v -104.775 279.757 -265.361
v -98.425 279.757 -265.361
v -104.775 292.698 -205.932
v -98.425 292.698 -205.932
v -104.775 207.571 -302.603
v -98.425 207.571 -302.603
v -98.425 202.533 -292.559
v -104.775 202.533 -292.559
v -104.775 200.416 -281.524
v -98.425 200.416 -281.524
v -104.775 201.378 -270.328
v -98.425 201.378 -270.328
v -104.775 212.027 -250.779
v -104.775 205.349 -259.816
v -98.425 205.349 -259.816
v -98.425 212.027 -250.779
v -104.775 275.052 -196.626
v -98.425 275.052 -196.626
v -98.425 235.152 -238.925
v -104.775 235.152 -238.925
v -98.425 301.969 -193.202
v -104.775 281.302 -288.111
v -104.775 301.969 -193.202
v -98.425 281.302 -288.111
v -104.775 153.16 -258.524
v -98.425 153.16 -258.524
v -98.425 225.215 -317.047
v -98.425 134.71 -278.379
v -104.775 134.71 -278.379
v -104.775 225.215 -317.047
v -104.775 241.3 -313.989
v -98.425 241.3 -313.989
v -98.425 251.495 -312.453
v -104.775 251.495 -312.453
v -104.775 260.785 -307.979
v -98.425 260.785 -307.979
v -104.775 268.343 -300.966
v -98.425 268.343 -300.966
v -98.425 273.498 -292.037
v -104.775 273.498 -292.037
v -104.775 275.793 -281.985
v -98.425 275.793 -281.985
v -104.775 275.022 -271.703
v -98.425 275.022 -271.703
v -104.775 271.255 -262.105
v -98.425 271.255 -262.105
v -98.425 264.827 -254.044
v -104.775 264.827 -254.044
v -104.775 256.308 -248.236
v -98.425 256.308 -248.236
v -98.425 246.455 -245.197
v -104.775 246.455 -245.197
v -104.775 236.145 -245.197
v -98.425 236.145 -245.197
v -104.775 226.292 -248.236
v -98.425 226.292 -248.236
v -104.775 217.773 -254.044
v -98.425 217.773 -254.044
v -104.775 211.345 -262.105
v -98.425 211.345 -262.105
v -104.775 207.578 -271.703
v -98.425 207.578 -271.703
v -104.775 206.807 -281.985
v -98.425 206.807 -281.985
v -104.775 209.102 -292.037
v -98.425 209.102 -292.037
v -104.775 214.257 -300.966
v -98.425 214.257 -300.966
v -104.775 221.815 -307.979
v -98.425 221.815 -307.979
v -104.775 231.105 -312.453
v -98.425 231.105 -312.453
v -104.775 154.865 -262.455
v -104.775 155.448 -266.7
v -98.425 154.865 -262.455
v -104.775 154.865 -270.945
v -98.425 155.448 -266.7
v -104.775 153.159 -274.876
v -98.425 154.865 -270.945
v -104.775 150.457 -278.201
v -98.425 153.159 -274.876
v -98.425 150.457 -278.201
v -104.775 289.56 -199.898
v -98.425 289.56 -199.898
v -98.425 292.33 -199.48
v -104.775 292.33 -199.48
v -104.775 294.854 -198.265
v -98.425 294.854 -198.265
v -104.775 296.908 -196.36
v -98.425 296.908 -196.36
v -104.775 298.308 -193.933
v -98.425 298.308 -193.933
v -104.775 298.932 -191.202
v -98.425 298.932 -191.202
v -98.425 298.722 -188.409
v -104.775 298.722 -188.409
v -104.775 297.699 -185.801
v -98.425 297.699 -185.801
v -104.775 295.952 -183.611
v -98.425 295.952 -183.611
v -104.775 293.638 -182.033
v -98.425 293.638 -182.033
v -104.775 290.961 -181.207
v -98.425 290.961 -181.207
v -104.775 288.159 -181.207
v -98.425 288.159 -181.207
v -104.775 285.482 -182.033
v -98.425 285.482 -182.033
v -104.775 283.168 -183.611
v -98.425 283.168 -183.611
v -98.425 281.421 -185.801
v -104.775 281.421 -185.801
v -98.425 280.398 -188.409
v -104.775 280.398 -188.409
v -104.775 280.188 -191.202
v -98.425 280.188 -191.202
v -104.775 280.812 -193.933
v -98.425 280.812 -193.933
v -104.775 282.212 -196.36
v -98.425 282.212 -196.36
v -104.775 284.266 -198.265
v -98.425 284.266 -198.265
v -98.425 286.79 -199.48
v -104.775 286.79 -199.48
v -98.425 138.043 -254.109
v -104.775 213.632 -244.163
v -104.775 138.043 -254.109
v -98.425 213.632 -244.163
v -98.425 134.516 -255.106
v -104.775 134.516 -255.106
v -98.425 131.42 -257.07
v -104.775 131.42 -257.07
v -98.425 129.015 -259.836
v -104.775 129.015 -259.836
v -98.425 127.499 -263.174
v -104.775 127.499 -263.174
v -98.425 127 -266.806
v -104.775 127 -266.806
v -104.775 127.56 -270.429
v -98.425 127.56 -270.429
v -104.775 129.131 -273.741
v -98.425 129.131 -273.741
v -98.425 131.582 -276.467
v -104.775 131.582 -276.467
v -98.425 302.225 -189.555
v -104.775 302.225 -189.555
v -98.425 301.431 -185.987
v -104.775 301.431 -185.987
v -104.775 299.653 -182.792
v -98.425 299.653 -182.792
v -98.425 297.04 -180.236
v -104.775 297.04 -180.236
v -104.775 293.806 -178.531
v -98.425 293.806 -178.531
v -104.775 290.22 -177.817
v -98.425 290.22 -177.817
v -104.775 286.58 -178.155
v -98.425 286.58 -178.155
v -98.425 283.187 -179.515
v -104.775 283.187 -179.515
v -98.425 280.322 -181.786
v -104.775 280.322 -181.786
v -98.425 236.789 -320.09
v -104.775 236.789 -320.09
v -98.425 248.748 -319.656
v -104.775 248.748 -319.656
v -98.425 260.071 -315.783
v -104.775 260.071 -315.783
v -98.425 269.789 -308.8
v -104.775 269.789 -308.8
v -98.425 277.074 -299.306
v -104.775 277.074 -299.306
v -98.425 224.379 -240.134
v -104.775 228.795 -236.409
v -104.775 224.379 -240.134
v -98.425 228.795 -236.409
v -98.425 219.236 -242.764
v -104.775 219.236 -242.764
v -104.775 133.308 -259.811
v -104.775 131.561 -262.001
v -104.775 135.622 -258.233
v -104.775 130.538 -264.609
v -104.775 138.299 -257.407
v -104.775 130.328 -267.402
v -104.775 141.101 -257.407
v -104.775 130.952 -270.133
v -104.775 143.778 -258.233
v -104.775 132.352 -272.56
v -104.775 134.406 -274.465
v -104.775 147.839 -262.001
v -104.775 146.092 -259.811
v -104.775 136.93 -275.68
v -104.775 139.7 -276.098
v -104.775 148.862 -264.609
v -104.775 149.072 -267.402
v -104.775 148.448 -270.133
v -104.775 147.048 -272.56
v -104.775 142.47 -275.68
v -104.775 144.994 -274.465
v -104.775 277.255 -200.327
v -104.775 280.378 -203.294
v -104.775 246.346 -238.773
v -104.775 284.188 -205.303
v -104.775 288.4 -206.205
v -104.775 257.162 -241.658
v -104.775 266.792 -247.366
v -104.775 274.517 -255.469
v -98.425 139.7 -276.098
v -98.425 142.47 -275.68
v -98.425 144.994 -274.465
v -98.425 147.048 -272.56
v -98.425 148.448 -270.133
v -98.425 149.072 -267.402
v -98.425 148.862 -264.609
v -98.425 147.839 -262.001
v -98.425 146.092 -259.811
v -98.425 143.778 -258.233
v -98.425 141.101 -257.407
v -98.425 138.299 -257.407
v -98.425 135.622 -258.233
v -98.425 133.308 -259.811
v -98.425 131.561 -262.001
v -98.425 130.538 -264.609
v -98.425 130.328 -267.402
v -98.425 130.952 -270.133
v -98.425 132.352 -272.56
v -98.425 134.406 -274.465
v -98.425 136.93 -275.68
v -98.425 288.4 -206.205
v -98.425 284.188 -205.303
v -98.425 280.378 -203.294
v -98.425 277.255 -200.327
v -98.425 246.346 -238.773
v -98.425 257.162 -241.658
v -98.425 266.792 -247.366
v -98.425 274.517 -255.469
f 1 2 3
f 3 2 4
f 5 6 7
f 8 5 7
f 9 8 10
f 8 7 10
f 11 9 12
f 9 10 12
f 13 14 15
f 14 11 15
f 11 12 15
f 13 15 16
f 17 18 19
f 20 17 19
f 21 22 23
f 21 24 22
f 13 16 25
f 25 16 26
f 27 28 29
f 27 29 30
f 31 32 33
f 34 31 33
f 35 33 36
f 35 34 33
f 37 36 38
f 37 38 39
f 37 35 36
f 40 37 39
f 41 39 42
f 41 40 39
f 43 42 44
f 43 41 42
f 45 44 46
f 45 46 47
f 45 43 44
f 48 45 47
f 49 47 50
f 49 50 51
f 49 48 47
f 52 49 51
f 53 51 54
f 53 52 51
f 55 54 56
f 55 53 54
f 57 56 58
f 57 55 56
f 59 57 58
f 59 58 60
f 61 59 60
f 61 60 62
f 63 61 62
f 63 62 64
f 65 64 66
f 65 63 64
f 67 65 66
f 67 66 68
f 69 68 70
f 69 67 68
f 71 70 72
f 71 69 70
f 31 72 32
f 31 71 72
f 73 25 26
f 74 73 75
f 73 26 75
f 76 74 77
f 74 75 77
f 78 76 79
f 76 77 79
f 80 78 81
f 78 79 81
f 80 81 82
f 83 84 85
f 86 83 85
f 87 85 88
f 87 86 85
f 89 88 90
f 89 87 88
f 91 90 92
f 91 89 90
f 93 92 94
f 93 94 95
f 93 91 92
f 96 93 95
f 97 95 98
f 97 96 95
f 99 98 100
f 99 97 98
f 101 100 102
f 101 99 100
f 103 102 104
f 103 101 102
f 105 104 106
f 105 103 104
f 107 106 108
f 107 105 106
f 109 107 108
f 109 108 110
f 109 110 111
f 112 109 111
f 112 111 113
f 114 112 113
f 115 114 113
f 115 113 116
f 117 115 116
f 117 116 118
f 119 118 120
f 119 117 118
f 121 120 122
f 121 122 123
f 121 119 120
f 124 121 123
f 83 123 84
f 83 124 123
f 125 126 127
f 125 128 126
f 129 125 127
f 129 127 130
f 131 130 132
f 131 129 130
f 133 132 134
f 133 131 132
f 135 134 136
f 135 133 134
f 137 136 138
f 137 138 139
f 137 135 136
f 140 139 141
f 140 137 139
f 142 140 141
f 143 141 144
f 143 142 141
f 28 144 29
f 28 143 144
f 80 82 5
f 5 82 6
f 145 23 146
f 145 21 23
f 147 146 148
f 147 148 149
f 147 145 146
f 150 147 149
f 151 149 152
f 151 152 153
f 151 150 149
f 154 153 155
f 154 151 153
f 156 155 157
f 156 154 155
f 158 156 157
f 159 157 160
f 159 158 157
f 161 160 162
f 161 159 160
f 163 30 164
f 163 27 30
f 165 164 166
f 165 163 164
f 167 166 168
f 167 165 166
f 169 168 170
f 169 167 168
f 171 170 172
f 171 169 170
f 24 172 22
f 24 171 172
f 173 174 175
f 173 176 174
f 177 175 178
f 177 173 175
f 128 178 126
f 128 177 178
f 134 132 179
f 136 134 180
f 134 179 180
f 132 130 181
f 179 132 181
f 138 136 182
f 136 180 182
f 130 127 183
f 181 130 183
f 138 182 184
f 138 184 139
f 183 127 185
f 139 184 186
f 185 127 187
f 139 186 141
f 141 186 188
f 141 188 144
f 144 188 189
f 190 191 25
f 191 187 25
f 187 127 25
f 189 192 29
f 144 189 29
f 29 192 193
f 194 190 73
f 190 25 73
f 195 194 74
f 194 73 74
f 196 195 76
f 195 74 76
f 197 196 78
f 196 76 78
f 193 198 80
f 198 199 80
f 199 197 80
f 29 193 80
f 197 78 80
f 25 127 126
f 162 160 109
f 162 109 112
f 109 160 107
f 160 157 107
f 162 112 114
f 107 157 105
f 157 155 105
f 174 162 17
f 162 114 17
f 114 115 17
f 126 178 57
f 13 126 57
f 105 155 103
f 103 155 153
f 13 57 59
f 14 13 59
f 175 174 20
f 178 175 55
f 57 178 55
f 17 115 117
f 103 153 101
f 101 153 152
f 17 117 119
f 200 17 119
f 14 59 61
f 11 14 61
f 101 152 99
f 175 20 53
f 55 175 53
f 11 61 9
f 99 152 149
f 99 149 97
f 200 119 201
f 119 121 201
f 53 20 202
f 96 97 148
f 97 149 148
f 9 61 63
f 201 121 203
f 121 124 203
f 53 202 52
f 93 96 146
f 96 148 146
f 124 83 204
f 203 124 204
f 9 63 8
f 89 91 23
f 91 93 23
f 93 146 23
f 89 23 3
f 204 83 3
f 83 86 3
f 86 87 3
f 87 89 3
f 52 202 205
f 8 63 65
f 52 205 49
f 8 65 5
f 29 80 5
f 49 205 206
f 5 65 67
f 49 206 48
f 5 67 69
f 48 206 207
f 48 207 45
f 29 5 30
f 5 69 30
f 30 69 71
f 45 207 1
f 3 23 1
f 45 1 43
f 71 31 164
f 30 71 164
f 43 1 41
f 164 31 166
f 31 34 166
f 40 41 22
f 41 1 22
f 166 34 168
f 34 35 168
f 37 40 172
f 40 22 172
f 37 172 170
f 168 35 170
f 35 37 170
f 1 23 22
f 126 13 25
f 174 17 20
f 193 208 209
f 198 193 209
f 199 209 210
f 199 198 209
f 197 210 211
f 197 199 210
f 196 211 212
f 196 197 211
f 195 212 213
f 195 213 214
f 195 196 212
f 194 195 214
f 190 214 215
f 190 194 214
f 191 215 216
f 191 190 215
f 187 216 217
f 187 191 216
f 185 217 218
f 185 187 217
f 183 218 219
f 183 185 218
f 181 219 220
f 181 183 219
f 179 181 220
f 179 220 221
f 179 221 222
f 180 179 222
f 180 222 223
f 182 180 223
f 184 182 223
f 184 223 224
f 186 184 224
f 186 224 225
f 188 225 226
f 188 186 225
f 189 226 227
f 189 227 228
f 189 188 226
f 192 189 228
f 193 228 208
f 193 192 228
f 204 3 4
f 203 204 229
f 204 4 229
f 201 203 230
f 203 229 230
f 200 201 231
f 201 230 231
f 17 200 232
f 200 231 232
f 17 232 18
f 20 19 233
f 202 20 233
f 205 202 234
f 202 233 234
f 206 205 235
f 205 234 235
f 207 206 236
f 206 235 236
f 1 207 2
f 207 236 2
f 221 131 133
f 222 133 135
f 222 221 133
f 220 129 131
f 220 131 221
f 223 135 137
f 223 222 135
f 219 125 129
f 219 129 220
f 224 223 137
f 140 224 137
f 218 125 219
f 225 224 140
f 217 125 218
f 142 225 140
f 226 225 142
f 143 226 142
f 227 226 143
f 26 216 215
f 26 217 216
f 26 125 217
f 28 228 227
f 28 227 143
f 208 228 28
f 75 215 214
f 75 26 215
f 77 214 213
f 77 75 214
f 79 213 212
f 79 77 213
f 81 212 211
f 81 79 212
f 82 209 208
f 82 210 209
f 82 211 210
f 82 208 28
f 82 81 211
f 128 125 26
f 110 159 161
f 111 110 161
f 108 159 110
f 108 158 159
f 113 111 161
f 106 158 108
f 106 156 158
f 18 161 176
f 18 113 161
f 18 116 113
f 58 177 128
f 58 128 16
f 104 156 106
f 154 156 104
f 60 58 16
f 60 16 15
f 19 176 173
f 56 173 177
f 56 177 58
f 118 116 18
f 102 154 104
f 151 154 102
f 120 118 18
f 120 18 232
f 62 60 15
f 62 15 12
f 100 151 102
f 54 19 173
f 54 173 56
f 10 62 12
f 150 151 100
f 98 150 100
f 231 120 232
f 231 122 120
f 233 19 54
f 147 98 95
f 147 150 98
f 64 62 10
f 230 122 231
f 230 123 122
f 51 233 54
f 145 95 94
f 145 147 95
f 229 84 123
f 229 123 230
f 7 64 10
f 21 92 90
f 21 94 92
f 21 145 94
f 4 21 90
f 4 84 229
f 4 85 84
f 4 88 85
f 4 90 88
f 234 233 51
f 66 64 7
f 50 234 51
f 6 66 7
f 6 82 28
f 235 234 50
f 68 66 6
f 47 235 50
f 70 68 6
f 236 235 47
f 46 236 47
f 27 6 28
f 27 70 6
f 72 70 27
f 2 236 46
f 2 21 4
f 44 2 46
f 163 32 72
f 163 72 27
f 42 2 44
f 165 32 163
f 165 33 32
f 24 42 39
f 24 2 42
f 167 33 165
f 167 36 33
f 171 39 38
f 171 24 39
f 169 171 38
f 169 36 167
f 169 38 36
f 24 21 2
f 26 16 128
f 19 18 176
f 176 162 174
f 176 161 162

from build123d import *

# Parameters (mm, degrees)
SKETCH1_R           = 9.398
SKETCH1_R_2         = 34.589431616
BOSS_EXTRUDE1_DEPTH = 3.175
FILLET1_R           = 25.4
CUT_EXTRUDE1_DEPTH  = 7.35


with BuildPart() as part:
    # Sketch1 → Boss-Extrude1 (new body, symmetric)
    with BuildSketch(Plane(origin=(-101.6, 0, 0), x_dir=(0, 0, -1), z_dir=(1, 0, 0))):
        with BuildLine():
            Line((181.785515067, 280.321615274), (242.984426747, 222.593234225))
            Line((242.984426747, 222.593234225), (254.108513166, 138.043359025))
            ThreePointArc((254.108513166, 138.043359025), (264.972075139, 127.118097295), (278.378708009, 134.710232547))
            Line((278.378708009, 134.710232547), (317.047217946, 225.215098942))
            ThreePointArc((317.047217946, 225.215098942), (315.782704, 260.070612955), (288.110795268, 281.301988787))
            Line((288.110795268, 281.301988787), (193.202213869, 301.969191763))
            ThreePointArc((193.202213869, 301.969191763), (179.266512438, 295.48442041), (181.785515067, 280.321615274))
        make_face()
        with Locations((190.5, 289.56)):
            Circle(SKETCH1_R, mode=Mode.SUBTRACT)
        with Locations((279.4, 241.3)):
            Circle(SKETCH1_R_2, mode=Mode.SUBTRACT)
        with Locations((266.7, 139.7)):
            Circle(SKETCH1_R, mode=Mode.SUBTRACT)
    extrude(amount=BOSS_EXTRUDE1_DEPTH, both=True)

    # Fillet1
    fillet1_edges = [part.edges().sort_by_distance(p)[0] for p in [
        (-101.6, 222.593234225, -242.984426747),
    ]]
    fillet(fillet1_edges, radius=FILLET1_R)

    # Sketch2 → Cut-Extrude1 (cut, through all)
    with BuildSketch(Plane(origin=(-98.425, 0, 0), x_dir=(0, 0, -1), z_dir=(1, 0, 0))):
        with BuildLine():
            Line((196.625780281, 275.052266892), (238.924841277, 235.151944416))
            ThreePointArc((238.924841277, 235.151944416), (244.181424008, 262.17316378), (265.361199141, 279.757107685))
            Line((265.361199141, 279.757107685), (205.932122543, 292.698327232))
            ThreePointArc((205.932122543, 292.698327232), (204.429524577, 282.213718691), (196.625780281, 275.052266892))
        make_face()
        with BuildLine():
            Line((250.779296509, 212.027275618), (258.524425256, 153.159549829))
            ThreePointArc((258.524425256, 153.159549829), (268.842626828, 155.301559354), (278.201366063, 150.45723397))
            Line((278.201366063, 150.45723397), (302.603477212, 207.571144307))
            ThreePointArc((302.603477212, 207.571144307), (275.892741569, 200.511077492), (250.779296509, 212.027275618))
        make_face()
    extrude(amount=-CUT_EXTRUDE1_DEPTH, mode=Mode.SUBTRACT)


solid = part.part
